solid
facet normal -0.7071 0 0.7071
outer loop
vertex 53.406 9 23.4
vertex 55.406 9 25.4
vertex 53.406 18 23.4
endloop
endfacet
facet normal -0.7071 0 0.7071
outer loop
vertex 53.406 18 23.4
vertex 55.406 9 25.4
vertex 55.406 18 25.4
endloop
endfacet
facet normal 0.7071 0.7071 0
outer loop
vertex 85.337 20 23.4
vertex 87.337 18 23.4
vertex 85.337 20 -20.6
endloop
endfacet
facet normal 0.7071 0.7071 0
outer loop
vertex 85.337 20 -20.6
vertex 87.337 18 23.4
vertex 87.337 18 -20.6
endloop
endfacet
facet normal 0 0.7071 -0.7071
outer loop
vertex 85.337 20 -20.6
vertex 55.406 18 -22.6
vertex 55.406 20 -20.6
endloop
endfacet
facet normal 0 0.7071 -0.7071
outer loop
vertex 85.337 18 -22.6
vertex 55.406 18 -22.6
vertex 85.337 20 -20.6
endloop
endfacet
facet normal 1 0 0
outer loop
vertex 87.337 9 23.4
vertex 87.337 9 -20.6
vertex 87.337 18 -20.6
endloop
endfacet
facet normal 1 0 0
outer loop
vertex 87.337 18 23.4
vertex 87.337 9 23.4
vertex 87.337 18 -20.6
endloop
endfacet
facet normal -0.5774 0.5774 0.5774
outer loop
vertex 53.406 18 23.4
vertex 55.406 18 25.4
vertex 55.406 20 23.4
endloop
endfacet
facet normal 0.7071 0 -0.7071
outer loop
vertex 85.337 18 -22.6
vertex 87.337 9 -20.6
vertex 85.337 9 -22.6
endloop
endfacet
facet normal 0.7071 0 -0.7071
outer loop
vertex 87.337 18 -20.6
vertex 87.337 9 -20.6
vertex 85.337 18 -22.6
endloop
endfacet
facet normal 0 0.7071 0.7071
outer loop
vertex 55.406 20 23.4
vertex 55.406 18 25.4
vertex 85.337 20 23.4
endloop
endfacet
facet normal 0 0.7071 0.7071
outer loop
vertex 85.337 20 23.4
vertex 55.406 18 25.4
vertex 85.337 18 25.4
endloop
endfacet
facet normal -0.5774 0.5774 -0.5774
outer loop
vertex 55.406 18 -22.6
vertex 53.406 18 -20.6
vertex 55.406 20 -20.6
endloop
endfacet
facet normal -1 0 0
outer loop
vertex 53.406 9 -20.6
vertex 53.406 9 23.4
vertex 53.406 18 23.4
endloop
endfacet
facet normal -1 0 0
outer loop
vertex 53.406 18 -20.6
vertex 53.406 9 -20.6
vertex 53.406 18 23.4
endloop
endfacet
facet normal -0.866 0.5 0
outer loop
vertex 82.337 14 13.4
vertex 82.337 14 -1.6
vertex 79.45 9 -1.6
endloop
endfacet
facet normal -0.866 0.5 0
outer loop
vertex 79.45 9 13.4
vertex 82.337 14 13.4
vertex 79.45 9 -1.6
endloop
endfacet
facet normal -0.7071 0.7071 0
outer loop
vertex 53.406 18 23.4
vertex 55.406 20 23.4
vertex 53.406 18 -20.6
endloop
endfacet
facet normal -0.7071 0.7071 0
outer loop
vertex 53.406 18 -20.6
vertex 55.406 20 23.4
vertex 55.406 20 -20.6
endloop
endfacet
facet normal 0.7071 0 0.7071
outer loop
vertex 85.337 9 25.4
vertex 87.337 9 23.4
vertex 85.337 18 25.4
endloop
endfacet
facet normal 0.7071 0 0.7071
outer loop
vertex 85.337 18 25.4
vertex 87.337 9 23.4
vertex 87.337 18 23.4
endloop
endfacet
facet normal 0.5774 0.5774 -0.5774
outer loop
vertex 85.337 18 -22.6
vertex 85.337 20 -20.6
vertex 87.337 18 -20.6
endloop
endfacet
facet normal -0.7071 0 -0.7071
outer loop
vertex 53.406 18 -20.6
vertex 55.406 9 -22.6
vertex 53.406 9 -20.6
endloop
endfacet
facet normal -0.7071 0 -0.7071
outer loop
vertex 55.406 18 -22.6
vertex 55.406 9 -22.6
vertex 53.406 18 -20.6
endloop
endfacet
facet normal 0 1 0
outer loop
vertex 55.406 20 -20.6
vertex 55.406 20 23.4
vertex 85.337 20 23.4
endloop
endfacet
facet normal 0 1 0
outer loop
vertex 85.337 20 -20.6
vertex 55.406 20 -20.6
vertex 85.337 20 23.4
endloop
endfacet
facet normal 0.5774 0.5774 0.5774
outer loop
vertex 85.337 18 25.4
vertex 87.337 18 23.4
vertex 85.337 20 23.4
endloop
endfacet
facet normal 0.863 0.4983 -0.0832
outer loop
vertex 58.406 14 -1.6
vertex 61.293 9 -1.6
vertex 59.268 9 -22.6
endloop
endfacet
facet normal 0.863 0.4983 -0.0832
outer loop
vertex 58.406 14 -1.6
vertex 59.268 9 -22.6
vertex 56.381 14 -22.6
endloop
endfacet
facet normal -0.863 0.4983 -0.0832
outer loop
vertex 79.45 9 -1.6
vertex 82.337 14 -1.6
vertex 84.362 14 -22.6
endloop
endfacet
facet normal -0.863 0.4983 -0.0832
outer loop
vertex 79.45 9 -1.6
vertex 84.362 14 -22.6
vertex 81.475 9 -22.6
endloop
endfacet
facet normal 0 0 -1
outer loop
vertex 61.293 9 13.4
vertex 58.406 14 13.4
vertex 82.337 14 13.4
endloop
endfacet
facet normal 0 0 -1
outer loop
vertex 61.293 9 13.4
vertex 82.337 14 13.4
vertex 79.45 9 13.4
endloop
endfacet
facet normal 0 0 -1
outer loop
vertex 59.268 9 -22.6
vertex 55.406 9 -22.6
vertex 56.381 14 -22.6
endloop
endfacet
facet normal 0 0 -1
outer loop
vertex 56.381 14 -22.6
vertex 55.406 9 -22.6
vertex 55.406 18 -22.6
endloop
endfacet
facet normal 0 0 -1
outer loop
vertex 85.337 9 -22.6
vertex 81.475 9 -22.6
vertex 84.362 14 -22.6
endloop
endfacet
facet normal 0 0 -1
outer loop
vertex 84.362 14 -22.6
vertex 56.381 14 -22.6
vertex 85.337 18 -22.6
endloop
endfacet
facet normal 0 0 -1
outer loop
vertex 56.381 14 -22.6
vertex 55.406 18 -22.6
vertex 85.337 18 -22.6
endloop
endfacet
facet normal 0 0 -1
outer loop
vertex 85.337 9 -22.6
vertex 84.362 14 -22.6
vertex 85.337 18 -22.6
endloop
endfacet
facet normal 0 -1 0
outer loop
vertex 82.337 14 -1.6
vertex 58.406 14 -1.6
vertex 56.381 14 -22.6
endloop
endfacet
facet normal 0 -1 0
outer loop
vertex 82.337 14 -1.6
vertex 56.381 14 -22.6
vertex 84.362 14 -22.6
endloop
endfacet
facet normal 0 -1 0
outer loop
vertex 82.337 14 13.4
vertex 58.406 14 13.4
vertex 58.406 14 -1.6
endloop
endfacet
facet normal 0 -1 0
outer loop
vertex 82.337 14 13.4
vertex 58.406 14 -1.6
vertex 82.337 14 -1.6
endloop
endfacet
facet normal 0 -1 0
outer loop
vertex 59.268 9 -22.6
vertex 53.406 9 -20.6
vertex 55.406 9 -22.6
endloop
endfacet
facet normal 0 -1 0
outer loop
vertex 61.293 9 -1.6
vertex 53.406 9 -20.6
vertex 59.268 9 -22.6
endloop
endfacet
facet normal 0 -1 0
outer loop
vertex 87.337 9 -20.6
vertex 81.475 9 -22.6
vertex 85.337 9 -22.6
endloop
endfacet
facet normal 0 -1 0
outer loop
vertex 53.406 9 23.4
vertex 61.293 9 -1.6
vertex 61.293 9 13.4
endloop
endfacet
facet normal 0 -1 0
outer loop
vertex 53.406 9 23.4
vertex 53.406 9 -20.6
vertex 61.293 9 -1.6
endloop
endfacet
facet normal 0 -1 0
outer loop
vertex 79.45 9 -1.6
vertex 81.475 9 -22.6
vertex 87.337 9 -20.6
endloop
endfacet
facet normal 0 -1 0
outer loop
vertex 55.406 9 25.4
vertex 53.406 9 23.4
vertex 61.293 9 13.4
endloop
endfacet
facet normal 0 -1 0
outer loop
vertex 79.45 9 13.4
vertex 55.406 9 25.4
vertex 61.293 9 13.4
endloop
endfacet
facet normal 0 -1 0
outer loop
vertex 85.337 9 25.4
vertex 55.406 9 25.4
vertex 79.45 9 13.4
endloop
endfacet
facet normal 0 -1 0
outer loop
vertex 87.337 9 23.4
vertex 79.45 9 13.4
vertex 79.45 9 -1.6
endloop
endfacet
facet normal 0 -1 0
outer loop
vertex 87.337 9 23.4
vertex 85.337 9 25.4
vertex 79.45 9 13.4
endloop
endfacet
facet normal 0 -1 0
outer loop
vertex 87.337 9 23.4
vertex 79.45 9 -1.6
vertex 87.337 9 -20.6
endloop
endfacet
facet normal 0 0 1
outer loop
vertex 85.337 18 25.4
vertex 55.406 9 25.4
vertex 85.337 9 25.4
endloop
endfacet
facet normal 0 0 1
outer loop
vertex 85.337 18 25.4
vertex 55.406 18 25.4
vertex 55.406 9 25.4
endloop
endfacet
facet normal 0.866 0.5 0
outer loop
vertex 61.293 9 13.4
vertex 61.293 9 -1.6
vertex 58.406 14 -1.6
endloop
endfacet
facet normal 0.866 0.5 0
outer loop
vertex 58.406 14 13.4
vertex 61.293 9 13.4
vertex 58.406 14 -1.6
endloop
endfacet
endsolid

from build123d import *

# Parameters (mm, degrees)
SKETCH039_W     = 33.930523
SKETCH039_H     = 11
PAD014_DEPTH    = 48
POCKET014_DEPTH = 15
CHAMFER002_SIZE = 2


with BuildPart() as part:
    # Sketch039 (on Face1 of Binder017) → Pad014 (new body)
    with BuildSketch(Plane.XY.offset(25.4)):
        with Locations((70.371465, 14.5)):
            Rectangle(SKETCH039_W, SKETCH039_H)
    extrude(amount=-PAD014_DEPTH)

    # Sketch041 (on Face1 of Binder019) → SubtractiveLoft section 0
    with BuildSketch(Plane(origin=(0, 0, -23.6), x_dir=(1, 0, 0), z_dir=(0, 0, -1))):
        Polygon((56.284717, -14), (84.458214, -14), (81.571463, -9), (59.171468, -9), align=None)
    # Sketch040 (on Face1 of Binder018) → SubtractiveLoft section 1
    with BuildSketch(Plane.XY.offset(-1.6)):
        Polygon((58.406204, 14), (82.336727, 14), (79.449975, 9), (61.292955, 9), align=None)
    loft(mode=Mode.SUBTRACT)

    # SubtractiveLoft Face6 → Pocket014 (cut)
    with BuildSketch(Plane(origin=(70.371465, 11.614315, -1.6), x_dir=(0, -1, 0), z_dir=(0, 0, -1))):
        Polygon((-2.385685, 11.965261), (-2.385685, -11.965261), (2.614315, -9.07851), (2.614315, 9.07851), align=None)
    extrude(amount=-POCKET014_DEPTH, mode=Mode.SUBTRACT)

    # Chamfer002
    chamfer002_edges = [part.edges().sort_by_distance(p)[0] for p in [
        (87.336727, 14.5, 25.4),
        (87.336727, 20, 1.4),
        (70.371465, 20, 25.4),
        (53.406204, 14.5, 25.4),
        (53.406204, 20, 1.4),
        (53.406204, 14.5, -22.6),
        (70.371465, 20, -22.6),
        (87.336727, 14.5, -22.6),
    ]]
    chamfer(chamfer002_edges, length=CHAMFER002_SIZE)


solid = part.part
